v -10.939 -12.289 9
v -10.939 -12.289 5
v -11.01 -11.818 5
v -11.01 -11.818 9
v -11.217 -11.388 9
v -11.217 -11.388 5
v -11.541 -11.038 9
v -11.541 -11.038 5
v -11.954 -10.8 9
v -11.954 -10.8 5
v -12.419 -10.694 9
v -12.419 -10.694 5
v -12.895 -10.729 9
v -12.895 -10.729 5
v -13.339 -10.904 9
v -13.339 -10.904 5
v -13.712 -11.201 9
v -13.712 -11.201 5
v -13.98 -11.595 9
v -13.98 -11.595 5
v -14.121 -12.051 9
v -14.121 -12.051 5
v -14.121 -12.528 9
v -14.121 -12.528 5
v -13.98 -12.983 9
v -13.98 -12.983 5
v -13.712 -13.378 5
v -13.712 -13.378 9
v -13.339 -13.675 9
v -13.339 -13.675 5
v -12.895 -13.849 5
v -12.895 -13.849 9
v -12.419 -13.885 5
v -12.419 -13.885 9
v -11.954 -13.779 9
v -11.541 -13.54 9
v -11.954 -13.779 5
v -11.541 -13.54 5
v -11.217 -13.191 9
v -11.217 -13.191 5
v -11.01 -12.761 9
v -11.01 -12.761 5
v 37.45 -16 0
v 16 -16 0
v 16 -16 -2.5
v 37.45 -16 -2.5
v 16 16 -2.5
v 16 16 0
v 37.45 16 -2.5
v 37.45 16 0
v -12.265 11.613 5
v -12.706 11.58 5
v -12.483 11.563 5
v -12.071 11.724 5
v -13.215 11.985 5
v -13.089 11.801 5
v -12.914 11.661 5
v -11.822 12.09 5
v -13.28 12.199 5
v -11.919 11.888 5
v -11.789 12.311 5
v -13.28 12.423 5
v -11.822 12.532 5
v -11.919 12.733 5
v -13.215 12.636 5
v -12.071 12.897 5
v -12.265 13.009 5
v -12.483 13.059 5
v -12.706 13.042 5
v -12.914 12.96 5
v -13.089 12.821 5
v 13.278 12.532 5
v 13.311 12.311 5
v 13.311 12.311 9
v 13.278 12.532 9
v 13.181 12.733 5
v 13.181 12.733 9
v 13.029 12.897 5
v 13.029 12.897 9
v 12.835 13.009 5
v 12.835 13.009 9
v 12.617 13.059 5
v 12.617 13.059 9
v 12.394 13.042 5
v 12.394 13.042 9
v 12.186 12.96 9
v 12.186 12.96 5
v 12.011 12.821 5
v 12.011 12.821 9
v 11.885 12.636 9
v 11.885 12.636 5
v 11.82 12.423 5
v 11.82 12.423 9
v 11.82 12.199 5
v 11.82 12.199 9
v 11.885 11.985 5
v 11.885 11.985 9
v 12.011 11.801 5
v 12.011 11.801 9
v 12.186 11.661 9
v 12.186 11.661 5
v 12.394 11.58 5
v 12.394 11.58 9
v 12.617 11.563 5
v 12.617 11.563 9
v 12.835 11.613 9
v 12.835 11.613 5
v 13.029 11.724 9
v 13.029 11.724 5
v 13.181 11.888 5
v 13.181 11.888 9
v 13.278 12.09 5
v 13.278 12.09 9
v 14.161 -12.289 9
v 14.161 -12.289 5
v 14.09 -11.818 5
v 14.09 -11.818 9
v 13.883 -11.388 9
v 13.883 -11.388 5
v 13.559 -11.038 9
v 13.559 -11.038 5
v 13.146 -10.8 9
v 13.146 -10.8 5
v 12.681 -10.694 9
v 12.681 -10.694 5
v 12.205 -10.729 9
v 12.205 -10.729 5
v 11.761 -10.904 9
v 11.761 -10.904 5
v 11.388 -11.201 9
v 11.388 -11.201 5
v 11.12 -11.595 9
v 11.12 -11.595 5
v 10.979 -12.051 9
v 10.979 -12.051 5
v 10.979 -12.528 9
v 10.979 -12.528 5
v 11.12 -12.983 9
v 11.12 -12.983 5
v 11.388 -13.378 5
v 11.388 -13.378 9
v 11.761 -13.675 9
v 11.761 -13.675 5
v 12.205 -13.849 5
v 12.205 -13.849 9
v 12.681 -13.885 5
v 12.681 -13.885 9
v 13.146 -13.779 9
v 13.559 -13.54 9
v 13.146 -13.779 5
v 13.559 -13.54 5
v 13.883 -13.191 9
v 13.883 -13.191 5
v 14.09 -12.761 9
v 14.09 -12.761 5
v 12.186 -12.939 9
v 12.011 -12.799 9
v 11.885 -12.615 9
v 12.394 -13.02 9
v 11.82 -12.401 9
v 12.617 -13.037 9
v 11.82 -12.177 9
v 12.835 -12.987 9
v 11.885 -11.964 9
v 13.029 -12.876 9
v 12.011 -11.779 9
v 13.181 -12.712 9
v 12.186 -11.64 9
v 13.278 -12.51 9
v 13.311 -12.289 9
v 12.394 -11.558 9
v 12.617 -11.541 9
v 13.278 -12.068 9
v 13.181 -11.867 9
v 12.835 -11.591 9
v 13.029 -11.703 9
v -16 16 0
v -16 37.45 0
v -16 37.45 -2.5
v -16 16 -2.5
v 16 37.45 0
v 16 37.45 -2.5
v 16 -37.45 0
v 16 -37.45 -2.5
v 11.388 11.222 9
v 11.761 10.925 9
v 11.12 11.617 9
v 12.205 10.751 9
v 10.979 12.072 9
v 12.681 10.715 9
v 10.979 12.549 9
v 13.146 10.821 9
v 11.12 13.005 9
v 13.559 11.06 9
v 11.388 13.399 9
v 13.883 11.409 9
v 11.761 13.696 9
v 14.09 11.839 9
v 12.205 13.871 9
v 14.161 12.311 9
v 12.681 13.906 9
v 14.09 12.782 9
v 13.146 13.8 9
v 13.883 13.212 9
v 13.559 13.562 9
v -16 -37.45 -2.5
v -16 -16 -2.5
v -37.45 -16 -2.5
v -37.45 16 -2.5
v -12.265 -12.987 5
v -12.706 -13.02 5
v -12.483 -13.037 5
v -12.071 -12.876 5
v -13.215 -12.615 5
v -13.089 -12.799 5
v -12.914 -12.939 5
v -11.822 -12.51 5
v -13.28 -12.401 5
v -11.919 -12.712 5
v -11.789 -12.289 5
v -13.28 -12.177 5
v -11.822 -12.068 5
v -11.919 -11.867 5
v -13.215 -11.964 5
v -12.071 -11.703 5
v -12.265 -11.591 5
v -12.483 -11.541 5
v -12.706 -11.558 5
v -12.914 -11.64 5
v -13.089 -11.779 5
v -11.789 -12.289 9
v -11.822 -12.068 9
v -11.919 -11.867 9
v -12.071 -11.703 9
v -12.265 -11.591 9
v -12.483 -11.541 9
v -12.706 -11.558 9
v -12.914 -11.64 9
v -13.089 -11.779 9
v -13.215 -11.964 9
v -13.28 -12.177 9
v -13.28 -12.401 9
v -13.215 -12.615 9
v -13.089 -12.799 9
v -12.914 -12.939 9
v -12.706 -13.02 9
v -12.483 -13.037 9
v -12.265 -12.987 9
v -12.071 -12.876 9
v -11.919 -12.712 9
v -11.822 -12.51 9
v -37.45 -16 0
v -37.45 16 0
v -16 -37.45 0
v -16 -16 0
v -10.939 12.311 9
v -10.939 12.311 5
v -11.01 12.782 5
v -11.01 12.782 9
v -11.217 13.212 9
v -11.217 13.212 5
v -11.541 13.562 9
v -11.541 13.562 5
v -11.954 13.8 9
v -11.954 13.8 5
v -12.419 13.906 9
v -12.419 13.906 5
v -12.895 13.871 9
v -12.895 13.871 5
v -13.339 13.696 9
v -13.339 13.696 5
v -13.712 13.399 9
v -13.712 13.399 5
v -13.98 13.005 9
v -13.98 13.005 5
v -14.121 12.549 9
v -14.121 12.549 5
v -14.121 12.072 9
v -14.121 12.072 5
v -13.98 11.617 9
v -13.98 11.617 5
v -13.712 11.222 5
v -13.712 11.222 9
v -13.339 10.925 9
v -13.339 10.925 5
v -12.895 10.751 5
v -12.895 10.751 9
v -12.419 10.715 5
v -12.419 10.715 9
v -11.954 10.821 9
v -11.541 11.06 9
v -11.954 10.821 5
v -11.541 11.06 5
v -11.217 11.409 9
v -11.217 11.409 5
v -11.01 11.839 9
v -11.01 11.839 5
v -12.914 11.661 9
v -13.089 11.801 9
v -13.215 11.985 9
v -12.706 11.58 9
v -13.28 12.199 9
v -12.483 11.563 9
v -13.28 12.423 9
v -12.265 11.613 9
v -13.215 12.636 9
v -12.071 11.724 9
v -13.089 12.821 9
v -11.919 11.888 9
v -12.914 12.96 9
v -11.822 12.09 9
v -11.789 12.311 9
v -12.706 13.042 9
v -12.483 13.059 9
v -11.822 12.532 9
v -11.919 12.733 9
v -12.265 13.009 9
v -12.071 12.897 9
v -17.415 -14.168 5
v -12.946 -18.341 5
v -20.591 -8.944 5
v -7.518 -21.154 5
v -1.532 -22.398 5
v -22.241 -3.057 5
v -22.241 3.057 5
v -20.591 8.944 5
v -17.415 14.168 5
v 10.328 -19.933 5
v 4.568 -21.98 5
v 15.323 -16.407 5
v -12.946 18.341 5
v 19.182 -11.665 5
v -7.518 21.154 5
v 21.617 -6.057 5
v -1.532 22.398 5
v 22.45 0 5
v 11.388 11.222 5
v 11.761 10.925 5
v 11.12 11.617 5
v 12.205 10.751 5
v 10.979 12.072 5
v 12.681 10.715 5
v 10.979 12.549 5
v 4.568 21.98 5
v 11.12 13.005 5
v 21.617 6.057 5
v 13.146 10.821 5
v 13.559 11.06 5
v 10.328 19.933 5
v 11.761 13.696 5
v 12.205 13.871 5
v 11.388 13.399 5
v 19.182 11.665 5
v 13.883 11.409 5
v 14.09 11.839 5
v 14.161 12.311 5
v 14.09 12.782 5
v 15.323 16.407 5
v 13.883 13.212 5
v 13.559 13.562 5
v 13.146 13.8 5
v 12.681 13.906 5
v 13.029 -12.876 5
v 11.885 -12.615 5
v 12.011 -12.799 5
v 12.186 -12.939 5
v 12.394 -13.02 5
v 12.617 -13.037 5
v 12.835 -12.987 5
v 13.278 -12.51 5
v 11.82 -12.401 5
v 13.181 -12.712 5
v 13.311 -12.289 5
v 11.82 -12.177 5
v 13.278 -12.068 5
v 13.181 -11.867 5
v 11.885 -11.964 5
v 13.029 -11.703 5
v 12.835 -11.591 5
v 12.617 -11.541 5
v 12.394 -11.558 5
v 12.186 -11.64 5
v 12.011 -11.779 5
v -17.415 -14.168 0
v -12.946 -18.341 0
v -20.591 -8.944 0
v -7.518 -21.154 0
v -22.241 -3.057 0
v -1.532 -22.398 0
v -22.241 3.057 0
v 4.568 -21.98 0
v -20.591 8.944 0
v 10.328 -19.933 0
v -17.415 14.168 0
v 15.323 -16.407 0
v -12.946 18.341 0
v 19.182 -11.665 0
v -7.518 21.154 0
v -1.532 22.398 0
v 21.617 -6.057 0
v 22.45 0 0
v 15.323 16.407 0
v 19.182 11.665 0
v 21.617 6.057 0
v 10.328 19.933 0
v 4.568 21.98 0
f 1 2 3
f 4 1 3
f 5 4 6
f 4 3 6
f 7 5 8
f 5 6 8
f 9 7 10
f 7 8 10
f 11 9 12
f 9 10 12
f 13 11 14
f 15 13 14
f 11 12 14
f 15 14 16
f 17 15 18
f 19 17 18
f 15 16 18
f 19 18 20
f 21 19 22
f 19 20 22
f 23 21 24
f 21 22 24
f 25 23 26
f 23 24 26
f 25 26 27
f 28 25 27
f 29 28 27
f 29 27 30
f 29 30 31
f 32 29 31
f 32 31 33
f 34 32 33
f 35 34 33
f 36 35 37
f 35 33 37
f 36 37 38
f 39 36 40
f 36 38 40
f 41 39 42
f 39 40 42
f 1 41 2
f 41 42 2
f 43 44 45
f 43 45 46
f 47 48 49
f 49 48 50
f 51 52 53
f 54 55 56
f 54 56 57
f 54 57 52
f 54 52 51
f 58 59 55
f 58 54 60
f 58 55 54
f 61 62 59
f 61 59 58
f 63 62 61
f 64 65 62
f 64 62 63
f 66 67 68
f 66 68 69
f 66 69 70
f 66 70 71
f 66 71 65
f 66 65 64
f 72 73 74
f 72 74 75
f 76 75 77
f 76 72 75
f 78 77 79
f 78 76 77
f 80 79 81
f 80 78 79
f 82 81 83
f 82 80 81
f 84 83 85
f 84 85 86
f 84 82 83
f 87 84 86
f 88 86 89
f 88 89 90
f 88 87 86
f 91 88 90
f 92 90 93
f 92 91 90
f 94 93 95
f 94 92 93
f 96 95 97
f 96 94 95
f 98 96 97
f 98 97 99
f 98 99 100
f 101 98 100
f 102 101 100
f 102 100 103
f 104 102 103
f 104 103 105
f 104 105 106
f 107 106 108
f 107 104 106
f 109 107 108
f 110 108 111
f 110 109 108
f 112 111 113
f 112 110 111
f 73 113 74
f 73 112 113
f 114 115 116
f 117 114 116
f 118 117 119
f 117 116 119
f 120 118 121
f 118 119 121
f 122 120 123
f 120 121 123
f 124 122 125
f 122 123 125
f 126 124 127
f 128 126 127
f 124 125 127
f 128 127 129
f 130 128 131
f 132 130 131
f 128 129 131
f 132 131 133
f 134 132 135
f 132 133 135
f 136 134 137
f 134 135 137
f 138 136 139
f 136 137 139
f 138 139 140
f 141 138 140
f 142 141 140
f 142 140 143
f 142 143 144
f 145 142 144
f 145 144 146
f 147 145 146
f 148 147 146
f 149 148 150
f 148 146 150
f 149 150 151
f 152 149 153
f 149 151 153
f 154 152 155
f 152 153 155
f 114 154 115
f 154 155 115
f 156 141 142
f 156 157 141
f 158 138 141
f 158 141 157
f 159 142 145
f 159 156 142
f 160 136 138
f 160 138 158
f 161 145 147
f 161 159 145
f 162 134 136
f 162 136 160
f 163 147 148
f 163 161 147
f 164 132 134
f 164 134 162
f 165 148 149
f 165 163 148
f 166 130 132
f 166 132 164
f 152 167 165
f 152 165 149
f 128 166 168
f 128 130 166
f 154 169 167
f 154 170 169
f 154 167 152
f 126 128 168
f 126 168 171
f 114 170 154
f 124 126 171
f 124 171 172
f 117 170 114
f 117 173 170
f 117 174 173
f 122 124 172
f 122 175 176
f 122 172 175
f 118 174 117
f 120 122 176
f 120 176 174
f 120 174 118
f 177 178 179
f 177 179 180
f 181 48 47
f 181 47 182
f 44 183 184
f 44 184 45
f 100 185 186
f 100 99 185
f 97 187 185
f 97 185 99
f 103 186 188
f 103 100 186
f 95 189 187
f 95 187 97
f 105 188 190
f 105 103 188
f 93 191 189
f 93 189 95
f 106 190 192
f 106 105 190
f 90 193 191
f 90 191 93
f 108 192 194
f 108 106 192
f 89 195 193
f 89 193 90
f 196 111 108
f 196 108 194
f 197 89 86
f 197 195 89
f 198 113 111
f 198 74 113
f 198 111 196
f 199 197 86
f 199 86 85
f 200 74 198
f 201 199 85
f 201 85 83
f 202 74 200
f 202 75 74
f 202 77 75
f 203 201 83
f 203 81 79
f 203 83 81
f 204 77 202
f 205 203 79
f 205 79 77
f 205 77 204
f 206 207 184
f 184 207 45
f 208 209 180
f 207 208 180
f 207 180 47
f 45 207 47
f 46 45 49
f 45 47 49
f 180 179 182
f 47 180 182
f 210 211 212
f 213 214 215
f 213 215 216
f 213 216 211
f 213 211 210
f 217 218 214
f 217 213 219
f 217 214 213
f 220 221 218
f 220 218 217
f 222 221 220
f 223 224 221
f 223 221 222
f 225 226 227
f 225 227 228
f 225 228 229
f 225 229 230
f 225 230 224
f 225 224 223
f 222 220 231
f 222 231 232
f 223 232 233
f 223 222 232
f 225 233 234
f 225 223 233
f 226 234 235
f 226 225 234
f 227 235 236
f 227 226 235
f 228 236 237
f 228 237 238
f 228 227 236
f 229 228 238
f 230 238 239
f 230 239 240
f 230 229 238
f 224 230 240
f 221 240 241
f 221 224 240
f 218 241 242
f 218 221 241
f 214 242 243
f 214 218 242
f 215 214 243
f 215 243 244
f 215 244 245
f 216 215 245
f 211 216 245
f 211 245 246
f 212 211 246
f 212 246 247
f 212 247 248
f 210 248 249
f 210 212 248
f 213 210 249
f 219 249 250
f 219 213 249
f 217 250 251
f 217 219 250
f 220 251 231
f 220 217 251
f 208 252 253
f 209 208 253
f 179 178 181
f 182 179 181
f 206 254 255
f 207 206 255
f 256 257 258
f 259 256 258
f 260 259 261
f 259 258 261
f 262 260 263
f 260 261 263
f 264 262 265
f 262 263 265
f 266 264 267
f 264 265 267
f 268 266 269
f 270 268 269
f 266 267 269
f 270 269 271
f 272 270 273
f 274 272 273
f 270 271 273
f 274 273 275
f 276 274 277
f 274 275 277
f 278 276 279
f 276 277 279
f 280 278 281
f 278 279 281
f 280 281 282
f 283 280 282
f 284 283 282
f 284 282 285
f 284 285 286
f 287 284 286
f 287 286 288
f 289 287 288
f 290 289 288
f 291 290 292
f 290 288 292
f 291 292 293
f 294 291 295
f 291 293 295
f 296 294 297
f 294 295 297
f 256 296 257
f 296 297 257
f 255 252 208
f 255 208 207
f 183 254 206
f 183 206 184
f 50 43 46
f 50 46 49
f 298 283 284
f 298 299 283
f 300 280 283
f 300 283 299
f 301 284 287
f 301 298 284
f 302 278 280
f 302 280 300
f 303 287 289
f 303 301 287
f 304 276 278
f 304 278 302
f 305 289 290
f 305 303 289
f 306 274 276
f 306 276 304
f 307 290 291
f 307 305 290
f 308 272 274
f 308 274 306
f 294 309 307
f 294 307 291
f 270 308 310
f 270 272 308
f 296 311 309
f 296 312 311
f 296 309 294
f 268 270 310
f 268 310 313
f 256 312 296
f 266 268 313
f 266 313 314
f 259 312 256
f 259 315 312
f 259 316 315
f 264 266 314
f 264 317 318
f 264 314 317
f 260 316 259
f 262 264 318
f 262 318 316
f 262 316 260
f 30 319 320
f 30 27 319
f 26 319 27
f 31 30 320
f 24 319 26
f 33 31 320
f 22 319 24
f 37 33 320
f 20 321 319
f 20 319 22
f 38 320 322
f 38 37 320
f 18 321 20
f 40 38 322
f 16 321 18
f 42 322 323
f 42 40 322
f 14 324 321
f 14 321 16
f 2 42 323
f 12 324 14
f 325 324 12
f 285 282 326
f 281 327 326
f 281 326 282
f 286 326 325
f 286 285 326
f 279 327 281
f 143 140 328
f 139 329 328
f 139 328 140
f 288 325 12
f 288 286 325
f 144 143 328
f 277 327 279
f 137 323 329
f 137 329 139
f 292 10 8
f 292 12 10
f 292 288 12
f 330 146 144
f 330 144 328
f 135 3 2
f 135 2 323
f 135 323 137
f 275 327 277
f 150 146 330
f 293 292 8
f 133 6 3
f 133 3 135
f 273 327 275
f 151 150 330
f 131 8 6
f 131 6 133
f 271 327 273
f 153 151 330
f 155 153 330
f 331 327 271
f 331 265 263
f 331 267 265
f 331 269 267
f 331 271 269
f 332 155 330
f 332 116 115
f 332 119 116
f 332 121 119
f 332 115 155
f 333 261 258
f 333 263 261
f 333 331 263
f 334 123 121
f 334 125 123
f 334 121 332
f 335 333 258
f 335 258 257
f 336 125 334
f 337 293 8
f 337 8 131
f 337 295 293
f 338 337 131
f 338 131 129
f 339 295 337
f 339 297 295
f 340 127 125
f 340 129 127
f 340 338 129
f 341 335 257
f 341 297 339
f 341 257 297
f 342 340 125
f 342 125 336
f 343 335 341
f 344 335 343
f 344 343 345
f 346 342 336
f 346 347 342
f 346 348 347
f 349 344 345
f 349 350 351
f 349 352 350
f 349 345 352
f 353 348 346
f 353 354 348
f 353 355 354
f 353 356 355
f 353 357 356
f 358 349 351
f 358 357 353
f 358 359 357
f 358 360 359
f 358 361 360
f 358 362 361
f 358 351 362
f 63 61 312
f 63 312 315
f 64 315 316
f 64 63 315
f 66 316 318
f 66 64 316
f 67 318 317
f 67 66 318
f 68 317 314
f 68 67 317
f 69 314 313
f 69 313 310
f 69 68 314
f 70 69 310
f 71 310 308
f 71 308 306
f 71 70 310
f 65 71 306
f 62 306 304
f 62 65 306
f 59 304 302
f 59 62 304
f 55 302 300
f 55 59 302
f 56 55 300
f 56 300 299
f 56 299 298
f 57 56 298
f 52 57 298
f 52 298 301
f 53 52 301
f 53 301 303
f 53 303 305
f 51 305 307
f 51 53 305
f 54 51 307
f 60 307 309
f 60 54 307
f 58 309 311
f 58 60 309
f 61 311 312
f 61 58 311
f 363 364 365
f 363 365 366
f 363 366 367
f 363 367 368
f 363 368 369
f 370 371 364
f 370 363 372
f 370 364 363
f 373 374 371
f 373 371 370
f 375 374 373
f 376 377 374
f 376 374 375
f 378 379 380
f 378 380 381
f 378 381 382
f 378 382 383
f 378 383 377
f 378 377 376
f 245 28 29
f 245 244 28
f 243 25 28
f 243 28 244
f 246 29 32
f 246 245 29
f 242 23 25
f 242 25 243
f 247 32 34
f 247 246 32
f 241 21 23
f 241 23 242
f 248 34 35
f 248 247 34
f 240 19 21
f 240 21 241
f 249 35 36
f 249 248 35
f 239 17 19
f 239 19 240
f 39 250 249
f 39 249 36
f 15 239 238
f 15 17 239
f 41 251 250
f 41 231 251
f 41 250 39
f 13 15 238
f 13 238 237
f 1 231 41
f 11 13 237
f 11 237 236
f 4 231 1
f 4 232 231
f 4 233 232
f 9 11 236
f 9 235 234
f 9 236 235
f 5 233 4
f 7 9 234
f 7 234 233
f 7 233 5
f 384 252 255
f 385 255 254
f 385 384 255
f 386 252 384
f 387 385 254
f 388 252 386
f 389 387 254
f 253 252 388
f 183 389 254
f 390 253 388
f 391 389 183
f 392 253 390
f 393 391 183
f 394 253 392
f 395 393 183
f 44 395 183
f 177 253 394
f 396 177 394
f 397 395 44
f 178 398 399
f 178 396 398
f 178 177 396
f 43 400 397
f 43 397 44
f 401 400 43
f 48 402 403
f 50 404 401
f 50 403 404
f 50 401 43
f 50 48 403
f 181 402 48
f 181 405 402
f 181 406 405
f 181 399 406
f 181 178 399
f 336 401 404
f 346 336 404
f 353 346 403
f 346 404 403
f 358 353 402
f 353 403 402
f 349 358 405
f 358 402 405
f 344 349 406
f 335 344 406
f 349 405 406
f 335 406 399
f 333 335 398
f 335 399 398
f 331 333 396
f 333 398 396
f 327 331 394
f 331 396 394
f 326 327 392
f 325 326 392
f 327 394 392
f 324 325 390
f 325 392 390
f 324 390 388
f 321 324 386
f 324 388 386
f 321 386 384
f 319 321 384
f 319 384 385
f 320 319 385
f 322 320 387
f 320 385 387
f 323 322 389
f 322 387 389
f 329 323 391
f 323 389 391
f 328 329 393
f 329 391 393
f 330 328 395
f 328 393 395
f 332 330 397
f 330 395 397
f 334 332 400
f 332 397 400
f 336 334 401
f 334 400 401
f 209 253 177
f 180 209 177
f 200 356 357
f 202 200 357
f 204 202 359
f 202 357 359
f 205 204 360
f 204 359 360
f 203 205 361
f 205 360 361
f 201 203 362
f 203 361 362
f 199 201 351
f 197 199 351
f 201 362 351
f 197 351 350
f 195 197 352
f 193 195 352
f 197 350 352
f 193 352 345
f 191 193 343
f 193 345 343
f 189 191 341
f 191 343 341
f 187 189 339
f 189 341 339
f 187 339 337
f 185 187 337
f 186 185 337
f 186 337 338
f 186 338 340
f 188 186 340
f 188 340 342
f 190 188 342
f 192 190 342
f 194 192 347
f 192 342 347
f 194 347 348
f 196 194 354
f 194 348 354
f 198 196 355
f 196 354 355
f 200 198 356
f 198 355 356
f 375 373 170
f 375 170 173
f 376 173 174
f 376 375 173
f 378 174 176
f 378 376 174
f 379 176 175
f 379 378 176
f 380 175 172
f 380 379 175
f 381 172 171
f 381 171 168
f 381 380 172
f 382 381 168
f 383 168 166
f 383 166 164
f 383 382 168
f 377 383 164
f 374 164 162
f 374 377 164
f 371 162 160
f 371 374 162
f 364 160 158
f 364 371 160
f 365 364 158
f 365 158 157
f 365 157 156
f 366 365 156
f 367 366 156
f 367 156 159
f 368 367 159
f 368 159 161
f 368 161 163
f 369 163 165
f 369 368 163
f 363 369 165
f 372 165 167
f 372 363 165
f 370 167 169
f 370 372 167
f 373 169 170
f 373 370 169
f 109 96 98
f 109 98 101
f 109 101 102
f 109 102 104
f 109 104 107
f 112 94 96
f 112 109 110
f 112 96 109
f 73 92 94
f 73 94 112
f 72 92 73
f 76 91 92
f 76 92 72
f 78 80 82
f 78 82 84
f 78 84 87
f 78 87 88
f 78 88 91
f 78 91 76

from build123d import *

# Parameters (mm, degrees)
F0_R     = 22.45
F1_DEPTH = 5
F2_W     = 32
F2_H     = 21.45
F2_H_2   = 32
F2_W_2   = 21.45
F3_DEPTH = 2.5
F4_R     = 1.6
F4_R_2   = 0.75
F5_DEPTH = 4


with BuildPart() as f1:
    # F0 (on Top) → F1 (new body)
    with BuildSketch(Plane.XY):
        Circle(F0_R)
    extrude(amount=F1_DEPTH)

    # F2 (on Top) → F3 (join)
    with BuildSketch(Plane.XY):
        with Locations((0, 26.725)):
            Rectangle(F2_W, F2_H)
        Rectangle(F2_W, F2_H_2)
        with Locations((-26.725, 0)):
            Rectangle(F2_W_2, F2_H_2)
        with Locations((26.725, 0)):
            Rectangle(F2_W_2, F2_H_2)
        with Locations((0, -26.725)):
            Rectangle(F2_W, F2_H)
    extrude(amount=-F3_DEPTH)

    # F4 (on face) → F5 (join)
    with BuildSketch(Plane.XY.offset(5)):
        with Locations((12.5612070115, 12.3107198171)):
            Circle(F4_R)
        with Locations((12.5612070115, 12.3107198171)):
            Circle(F4_R_2, mode=Mode.SUBTRACT)
        with Locations((-12.5387929885, 12.3107198171)):
            Circle(F4_R)
        with Locations((-12.5387929885, 12.3107198171)):
            Circle(F4_R_2, mode=Mode.SUBTRACT)
        with Locations((-12.5387929885, -12.2892801829)):
            Circle(F4_R)
        with Locations((-12.5387929885, -12.2892801829)):
            Circle(F4_R_2, mode=Mode.SUBTRACT)
        with Locations((12.5612070115, -12.2892801829)):
            Circle(F4_R)
        with Locations((12.5612070115, -12.2892801829)):
            Circle(F4_R_2, mode=Mode.SUBTRACT)
    extrude(amount=F5_DEPTH)


solid = f1.part
